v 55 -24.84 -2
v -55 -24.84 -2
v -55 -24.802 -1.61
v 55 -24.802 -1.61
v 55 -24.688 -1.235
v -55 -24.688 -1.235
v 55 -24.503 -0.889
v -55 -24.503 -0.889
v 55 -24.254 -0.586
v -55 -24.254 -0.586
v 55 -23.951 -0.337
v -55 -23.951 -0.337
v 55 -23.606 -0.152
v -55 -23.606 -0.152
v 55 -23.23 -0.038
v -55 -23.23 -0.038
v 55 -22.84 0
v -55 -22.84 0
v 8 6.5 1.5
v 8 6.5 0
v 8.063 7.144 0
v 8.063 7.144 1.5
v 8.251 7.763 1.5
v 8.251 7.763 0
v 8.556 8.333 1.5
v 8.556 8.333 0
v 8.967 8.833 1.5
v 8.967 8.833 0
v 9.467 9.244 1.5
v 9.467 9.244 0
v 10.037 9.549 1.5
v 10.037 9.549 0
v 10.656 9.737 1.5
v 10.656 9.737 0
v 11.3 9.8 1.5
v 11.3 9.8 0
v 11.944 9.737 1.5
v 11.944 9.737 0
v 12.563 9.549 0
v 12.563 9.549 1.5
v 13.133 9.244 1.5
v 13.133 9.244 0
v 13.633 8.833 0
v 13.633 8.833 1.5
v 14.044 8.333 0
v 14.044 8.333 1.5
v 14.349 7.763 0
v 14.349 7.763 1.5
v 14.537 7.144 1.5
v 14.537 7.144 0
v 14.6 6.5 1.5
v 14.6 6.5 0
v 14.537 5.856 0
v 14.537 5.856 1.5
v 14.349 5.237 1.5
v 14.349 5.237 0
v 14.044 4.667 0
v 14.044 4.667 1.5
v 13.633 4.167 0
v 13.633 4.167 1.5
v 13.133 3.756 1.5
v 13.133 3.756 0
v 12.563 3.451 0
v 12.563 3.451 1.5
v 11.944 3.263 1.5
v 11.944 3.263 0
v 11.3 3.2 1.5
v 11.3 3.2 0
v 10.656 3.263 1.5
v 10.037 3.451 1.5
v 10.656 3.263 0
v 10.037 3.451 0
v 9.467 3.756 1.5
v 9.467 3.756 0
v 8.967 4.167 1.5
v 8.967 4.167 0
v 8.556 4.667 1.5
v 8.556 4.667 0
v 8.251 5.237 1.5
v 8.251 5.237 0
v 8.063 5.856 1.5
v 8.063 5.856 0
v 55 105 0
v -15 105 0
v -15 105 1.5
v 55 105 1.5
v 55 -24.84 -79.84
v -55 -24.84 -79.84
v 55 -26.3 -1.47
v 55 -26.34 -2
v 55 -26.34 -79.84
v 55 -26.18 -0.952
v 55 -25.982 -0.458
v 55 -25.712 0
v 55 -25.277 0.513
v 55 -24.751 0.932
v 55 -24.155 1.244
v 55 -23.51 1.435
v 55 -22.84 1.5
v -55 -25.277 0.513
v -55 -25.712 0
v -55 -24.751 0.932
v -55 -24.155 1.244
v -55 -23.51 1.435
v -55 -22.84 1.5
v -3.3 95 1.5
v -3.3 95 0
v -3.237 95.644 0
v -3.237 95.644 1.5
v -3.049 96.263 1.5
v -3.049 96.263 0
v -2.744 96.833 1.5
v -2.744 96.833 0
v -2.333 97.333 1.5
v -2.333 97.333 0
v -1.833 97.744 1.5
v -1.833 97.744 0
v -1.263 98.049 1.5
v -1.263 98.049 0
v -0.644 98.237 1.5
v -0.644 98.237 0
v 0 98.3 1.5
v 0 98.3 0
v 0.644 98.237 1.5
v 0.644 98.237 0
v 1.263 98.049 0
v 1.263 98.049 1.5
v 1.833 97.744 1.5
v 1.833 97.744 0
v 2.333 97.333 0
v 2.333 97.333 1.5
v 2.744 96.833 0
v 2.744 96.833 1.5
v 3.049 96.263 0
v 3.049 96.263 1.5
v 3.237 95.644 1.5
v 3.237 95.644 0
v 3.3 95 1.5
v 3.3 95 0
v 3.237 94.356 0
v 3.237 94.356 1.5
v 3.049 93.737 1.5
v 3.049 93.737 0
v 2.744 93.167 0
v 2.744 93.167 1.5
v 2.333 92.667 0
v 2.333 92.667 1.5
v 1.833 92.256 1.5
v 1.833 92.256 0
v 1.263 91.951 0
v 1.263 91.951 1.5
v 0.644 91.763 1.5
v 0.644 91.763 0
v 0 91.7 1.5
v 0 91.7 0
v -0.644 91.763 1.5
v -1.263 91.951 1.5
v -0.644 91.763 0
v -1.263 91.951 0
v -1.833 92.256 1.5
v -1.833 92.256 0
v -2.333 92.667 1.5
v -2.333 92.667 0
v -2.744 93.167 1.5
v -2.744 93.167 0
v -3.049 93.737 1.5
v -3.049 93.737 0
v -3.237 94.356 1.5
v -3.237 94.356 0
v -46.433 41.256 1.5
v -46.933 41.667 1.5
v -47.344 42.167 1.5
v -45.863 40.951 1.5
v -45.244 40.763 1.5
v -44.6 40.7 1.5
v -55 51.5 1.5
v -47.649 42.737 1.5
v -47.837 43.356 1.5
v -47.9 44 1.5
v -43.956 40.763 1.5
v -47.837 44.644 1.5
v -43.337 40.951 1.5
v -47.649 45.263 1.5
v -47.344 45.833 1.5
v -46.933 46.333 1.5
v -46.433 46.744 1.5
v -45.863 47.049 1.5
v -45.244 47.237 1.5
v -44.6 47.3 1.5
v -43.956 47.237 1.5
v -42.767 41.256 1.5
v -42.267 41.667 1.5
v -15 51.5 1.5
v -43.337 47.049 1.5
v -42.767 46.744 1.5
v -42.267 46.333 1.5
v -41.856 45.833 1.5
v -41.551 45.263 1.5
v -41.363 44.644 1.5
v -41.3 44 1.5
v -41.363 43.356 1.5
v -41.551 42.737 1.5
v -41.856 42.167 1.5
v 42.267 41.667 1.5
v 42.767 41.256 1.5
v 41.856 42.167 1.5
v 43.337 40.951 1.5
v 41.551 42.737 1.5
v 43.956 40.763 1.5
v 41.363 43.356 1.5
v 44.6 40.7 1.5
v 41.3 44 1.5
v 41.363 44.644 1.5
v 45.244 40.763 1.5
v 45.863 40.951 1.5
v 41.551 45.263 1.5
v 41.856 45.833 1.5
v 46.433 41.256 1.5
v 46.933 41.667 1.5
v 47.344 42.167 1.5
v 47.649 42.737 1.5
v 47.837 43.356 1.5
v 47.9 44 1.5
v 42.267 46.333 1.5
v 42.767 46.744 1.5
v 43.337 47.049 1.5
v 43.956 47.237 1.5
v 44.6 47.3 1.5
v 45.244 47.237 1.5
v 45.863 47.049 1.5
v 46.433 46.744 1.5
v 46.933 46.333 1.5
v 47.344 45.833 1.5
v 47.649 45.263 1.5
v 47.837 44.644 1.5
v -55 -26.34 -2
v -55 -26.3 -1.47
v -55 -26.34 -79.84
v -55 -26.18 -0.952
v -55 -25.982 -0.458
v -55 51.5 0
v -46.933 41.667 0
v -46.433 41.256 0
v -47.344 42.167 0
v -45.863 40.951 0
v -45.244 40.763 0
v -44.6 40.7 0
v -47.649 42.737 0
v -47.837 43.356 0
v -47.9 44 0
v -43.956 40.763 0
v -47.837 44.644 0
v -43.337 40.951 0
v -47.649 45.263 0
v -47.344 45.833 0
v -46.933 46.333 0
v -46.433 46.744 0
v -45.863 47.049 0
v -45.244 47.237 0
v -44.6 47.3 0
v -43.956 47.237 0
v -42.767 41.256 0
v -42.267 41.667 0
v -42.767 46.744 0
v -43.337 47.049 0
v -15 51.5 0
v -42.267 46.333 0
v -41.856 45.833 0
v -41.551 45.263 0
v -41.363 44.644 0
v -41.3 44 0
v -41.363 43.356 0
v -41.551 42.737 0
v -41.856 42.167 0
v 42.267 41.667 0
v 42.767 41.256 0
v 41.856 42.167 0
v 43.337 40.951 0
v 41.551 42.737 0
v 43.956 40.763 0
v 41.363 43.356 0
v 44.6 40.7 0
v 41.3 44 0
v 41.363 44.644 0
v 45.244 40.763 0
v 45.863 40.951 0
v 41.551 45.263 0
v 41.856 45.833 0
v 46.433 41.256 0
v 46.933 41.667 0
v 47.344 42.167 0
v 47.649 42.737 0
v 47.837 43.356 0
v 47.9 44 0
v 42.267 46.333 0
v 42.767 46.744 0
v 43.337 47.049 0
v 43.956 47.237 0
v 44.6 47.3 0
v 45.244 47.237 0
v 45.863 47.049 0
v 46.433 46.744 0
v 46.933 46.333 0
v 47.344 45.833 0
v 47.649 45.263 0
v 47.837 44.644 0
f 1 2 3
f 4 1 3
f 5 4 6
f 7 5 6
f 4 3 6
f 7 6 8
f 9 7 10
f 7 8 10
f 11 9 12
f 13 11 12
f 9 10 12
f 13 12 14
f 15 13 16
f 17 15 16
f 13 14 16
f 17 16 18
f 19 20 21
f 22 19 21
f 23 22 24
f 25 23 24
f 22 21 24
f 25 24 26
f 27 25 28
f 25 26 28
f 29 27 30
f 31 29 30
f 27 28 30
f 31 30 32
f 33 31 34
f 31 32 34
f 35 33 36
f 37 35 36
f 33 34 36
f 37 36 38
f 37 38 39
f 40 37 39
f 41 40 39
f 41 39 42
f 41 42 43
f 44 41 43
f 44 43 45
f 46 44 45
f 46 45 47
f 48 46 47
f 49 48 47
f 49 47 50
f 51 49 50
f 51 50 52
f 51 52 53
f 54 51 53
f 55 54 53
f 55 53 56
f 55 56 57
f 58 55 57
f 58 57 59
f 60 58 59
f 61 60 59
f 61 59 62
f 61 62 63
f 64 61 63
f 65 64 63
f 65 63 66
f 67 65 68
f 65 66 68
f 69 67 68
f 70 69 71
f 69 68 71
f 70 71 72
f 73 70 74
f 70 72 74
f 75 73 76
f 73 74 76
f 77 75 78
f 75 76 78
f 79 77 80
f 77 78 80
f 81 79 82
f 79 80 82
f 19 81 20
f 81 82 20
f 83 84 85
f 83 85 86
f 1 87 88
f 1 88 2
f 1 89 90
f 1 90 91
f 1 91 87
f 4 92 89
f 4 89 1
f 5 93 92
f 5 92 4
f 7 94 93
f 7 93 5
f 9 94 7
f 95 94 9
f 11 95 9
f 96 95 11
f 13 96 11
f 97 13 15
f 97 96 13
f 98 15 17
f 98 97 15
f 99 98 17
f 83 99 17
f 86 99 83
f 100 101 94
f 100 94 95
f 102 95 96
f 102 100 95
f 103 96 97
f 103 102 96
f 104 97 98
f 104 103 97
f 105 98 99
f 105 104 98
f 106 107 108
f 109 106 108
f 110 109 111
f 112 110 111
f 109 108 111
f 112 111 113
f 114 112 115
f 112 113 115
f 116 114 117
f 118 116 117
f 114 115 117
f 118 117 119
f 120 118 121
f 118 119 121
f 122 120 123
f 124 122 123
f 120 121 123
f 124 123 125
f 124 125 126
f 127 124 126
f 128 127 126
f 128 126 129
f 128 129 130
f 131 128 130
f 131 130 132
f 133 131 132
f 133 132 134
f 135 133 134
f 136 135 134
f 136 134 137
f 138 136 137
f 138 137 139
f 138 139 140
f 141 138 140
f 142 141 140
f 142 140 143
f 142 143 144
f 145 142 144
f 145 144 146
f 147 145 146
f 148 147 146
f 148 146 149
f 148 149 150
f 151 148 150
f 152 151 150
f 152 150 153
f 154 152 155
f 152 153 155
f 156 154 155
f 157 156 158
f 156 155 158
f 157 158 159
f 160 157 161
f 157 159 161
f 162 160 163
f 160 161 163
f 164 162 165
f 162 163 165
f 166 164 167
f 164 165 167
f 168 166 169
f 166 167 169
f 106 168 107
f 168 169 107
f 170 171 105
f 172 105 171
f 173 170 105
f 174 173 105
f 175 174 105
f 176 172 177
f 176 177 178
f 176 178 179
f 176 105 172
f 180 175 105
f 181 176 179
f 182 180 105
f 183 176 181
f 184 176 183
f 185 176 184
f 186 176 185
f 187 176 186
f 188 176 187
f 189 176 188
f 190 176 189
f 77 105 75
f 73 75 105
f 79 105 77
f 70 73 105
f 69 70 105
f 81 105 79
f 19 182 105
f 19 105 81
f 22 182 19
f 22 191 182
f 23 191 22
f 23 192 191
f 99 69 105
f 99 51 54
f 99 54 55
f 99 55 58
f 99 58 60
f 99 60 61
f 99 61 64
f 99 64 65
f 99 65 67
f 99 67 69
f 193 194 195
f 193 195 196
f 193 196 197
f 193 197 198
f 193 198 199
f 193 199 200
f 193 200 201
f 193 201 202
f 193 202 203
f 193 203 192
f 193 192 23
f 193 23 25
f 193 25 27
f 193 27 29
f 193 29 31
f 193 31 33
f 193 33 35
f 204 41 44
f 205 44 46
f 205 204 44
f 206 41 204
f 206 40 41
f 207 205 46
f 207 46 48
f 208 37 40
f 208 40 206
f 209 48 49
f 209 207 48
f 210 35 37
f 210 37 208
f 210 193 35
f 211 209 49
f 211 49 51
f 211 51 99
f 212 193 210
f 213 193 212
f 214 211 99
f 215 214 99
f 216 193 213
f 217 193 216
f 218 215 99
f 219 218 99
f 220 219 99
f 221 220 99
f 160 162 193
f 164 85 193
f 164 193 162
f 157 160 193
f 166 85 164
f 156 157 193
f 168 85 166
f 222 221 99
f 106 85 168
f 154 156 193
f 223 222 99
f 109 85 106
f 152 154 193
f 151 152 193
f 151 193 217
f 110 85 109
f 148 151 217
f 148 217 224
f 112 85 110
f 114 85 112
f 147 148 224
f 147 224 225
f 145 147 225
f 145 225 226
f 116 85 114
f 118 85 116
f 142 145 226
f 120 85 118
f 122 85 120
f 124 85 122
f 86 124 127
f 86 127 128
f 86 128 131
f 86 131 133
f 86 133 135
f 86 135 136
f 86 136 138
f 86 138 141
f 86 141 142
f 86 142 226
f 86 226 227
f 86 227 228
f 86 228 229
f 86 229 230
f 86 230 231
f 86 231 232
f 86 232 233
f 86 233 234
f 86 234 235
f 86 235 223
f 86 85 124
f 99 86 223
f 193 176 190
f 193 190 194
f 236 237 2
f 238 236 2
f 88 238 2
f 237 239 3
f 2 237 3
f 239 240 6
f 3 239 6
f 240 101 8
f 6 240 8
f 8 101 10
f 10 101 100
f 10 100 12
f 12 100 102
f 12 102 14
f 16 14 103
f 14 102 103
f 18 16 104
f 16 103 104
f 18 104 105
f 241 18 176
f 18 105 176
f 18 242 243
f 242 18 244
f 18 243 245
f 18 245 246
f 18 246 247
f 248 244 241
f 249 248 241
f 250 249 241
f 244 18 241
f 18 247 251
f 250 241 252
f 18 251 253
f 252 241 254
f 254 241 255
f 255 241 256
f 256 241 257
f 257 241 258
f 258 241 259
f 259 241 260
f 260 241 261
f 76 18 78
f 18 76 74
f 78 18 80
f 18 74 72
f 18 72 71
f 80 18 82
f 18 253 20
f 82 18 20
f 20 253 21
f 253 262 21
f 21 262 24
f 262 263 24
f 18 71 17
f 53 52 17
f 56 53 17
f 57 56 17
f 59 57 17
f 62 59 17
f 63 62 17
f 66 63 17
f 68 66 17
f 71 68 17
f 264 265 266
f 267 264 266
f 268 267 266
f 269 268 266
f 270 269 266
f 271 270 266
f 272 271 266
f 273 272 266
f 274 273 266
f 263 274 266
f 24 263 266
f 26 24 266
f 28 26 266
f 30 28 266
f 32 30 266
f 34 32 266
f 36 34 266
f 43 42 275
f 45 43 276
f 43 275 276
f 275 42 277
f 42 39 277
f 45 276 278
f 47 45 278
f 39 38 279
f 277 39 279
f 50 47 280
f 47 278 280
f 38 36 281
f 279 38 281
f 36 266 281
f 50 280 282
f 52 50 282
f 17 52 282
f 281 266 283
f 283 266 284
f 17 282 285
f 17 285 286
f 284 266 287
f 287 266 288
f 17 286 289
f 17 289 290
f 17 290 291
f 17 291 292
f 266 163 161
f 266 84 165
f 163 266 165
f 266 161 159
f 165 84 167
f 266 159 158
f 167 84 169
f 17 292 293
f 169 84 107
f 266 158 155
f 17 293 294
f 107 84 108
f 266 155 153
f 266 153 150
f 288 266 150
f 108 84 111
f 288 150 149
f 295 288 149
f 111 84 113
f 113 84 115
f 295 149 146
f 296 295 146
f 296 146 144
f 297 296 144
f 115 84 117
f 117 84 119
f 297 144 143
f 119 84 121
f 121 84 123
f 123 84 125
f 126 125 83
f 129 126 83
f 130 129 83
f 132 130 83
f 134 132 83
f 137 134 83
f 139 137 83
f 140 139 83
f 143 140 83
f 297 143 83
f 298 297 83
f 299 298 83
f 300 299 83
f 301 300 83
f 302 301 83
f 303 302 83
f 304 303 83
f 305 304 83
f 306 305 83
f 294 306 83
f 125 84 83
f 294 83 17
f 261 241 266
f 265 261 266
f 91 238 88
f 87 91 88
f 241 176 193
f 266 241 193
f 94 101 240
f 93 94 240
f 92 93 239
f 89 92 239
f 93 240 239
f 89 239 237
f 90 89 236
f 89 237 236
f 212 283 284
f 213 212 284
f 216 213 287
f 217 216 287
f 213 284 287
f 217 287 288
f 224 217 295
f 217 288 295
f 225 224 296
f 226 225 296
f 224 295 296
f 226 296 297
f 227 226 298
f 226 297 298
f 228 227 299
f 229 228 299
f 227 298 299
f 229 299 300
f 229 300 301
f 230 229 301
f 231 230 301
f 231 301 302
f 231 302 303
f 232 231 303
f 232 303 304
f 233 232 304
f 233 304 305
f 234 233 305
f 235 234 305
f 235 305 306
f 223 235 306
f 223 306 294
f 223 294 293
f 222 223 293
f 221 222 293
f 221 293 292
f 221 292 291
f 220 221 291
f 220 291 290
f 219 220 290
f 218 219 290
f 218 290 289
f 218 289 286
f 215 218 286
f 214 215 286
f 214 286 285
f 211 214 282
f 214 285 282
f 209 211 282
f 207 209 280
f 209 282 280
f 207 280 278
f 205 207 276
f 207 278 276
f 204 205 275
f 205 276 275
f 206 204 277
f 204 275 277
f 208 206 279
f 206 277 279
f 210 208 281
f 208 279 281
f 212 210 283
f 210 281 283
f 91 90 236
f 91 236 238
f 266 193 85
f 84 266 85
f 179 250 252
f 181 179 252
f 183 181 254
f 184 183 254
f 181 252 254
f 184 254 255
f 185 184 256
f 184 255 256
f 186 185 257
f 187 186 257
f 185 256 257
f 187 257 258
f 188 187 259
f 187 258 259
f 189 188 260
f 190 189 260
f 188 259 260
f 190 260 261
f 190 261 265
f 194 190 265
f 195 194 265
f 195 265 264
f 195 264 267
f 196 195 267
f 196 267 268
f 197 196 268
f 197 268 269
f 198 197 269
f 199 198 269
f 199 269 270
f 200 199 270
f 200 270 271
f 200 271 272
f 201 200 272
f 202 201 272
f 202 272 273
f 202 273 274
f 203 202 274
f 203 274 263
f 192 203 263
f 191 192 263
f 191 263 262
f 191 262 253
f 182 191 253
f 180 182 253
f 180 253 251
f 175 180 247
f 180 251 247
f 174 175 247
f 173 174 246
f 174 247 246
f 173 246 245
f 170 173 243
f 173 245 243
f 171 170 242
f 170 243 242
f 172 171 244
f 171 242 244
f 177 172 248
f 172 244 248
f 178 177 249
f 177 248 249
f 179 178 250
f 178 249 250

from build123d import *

# Parameters (mm, degrees)
ESBO_O1_W                   = 110
ESBO_O1_H                   = 210
RESSALTO_EXTRUS_O1_DEPTH    = 1.5
FURO_COM_FOLGA_DE_M62_D     = 6.6
FURO_COM_FOLGA_DE_M62_DEPTH = 10
FURO_COM_FOLGA_DE_M62_TIP   = 1.982840043
ESBO_O4_W                   = 40
ESBO_O4_H                   = 53.5
CORTE_EXTRUS_O1_DEPTH       = 119.542186584
DOBRA_START                 = -55
DOBRA_ESBO_ADA1_DEPTH       = 110
DOBRA_ESBO_ADA1_2_DEPTH     = 110


# Read off the part's stored shape, not the designer's step: Transforma__o de esbo_o2
with BuildPart() as part:
    # Esboço1 → Ressalto-extrusão1 (new body)
    with BuildSketch(Plane.XY):
        Rectangle(ESBO_O1_W, ESBO_O1_H)
    extrude(amount=RESSALTO_EXTRUS_O1_DEPTH)

    # Furo com folga de M62
    with Locations(Plane.XY.offset(1.5)):
        with Locations((0, 95), (-44.6, 44), (44.6, 44), (11.3, 6.5)):
            Hole(FURO_COM_FOLGA_DE_M62_D / 2, depth=FURO_COM_FOLGA_DE_M62_DEPTH)
            with Locations((0, 0, -(FURO_COM_FOLGA_DE_M62_DEPTH + FURO_COM_FOLGA_DE_M62_TIP / 2))):  # 118° drill point
                Cone(0, FURO_COM_FOLGA_DE_M62_D / 2, FURO_COM_FOLGA_DE_M62_TIP, mode=Mode.SUBTRACT)

    # Esboço4 → Corte-extrusão1 (cut, through all)
    with BuildSketch(Plane.XY.offset(1.5)):
        with Locations((-35, 78.25)):
            Rectangle(ESBO_O4_W, ESBO_O4_H)
    extrude(amount=-CORTE_EXTRUS_O1_DEPTH, mode=Mode.SUBTRACT)

    # Dobra esboçada1 outline → Dobra esboçada1 (cut)
    with BuildSketch(Plane.YZ.offset(DOBRA_START)):
        with BuildLine():
            Line((-105, 0), (-25.712436374, 0))
            ThreePointArc((-25.712436374, 0), (-24.460340225, 1.102418411), (-22.840155051, 1.5))
            Line((-22.840155051, 1.5), (-105, 1.5))
            Line((-105, 1.5), (-105, 0))
        make_face()
    extrude(amount=DOBRA_ESBO_ADA1_DEPTH, mode=Mode.SUBTRACT)

    # Dobra esbo_ada1 2 outline → Dobra esbo_ada1 2 (add)
    with BuildSketch(Plane.YZ.offset(DOBRA_START)):
        with BuildLine():
            ThreePointArc((-25.712436374, 0), (-26.179540071, -0.951902827), (-26.340155051, -2))
            Line((-26.340155051, -2), (-26.340155051, -79.840155051))
            Line((-26.340155051, -79.840155051), (-24.840155051, -79.840155051))
            Line((-24.840155051, -79.840155051), (-24.840155051, -2))
            ThreePointArc((-24.840155051, -2), (-24.254368613, -0.585786438), (-22.840155051, 0))
            Line((-22.840155051, 0), (-25.712436374, 0))
        make_face()
    extrude(amount=DOBRA_ESBO_ADA1_2_DEPTH)


solid = part.part
